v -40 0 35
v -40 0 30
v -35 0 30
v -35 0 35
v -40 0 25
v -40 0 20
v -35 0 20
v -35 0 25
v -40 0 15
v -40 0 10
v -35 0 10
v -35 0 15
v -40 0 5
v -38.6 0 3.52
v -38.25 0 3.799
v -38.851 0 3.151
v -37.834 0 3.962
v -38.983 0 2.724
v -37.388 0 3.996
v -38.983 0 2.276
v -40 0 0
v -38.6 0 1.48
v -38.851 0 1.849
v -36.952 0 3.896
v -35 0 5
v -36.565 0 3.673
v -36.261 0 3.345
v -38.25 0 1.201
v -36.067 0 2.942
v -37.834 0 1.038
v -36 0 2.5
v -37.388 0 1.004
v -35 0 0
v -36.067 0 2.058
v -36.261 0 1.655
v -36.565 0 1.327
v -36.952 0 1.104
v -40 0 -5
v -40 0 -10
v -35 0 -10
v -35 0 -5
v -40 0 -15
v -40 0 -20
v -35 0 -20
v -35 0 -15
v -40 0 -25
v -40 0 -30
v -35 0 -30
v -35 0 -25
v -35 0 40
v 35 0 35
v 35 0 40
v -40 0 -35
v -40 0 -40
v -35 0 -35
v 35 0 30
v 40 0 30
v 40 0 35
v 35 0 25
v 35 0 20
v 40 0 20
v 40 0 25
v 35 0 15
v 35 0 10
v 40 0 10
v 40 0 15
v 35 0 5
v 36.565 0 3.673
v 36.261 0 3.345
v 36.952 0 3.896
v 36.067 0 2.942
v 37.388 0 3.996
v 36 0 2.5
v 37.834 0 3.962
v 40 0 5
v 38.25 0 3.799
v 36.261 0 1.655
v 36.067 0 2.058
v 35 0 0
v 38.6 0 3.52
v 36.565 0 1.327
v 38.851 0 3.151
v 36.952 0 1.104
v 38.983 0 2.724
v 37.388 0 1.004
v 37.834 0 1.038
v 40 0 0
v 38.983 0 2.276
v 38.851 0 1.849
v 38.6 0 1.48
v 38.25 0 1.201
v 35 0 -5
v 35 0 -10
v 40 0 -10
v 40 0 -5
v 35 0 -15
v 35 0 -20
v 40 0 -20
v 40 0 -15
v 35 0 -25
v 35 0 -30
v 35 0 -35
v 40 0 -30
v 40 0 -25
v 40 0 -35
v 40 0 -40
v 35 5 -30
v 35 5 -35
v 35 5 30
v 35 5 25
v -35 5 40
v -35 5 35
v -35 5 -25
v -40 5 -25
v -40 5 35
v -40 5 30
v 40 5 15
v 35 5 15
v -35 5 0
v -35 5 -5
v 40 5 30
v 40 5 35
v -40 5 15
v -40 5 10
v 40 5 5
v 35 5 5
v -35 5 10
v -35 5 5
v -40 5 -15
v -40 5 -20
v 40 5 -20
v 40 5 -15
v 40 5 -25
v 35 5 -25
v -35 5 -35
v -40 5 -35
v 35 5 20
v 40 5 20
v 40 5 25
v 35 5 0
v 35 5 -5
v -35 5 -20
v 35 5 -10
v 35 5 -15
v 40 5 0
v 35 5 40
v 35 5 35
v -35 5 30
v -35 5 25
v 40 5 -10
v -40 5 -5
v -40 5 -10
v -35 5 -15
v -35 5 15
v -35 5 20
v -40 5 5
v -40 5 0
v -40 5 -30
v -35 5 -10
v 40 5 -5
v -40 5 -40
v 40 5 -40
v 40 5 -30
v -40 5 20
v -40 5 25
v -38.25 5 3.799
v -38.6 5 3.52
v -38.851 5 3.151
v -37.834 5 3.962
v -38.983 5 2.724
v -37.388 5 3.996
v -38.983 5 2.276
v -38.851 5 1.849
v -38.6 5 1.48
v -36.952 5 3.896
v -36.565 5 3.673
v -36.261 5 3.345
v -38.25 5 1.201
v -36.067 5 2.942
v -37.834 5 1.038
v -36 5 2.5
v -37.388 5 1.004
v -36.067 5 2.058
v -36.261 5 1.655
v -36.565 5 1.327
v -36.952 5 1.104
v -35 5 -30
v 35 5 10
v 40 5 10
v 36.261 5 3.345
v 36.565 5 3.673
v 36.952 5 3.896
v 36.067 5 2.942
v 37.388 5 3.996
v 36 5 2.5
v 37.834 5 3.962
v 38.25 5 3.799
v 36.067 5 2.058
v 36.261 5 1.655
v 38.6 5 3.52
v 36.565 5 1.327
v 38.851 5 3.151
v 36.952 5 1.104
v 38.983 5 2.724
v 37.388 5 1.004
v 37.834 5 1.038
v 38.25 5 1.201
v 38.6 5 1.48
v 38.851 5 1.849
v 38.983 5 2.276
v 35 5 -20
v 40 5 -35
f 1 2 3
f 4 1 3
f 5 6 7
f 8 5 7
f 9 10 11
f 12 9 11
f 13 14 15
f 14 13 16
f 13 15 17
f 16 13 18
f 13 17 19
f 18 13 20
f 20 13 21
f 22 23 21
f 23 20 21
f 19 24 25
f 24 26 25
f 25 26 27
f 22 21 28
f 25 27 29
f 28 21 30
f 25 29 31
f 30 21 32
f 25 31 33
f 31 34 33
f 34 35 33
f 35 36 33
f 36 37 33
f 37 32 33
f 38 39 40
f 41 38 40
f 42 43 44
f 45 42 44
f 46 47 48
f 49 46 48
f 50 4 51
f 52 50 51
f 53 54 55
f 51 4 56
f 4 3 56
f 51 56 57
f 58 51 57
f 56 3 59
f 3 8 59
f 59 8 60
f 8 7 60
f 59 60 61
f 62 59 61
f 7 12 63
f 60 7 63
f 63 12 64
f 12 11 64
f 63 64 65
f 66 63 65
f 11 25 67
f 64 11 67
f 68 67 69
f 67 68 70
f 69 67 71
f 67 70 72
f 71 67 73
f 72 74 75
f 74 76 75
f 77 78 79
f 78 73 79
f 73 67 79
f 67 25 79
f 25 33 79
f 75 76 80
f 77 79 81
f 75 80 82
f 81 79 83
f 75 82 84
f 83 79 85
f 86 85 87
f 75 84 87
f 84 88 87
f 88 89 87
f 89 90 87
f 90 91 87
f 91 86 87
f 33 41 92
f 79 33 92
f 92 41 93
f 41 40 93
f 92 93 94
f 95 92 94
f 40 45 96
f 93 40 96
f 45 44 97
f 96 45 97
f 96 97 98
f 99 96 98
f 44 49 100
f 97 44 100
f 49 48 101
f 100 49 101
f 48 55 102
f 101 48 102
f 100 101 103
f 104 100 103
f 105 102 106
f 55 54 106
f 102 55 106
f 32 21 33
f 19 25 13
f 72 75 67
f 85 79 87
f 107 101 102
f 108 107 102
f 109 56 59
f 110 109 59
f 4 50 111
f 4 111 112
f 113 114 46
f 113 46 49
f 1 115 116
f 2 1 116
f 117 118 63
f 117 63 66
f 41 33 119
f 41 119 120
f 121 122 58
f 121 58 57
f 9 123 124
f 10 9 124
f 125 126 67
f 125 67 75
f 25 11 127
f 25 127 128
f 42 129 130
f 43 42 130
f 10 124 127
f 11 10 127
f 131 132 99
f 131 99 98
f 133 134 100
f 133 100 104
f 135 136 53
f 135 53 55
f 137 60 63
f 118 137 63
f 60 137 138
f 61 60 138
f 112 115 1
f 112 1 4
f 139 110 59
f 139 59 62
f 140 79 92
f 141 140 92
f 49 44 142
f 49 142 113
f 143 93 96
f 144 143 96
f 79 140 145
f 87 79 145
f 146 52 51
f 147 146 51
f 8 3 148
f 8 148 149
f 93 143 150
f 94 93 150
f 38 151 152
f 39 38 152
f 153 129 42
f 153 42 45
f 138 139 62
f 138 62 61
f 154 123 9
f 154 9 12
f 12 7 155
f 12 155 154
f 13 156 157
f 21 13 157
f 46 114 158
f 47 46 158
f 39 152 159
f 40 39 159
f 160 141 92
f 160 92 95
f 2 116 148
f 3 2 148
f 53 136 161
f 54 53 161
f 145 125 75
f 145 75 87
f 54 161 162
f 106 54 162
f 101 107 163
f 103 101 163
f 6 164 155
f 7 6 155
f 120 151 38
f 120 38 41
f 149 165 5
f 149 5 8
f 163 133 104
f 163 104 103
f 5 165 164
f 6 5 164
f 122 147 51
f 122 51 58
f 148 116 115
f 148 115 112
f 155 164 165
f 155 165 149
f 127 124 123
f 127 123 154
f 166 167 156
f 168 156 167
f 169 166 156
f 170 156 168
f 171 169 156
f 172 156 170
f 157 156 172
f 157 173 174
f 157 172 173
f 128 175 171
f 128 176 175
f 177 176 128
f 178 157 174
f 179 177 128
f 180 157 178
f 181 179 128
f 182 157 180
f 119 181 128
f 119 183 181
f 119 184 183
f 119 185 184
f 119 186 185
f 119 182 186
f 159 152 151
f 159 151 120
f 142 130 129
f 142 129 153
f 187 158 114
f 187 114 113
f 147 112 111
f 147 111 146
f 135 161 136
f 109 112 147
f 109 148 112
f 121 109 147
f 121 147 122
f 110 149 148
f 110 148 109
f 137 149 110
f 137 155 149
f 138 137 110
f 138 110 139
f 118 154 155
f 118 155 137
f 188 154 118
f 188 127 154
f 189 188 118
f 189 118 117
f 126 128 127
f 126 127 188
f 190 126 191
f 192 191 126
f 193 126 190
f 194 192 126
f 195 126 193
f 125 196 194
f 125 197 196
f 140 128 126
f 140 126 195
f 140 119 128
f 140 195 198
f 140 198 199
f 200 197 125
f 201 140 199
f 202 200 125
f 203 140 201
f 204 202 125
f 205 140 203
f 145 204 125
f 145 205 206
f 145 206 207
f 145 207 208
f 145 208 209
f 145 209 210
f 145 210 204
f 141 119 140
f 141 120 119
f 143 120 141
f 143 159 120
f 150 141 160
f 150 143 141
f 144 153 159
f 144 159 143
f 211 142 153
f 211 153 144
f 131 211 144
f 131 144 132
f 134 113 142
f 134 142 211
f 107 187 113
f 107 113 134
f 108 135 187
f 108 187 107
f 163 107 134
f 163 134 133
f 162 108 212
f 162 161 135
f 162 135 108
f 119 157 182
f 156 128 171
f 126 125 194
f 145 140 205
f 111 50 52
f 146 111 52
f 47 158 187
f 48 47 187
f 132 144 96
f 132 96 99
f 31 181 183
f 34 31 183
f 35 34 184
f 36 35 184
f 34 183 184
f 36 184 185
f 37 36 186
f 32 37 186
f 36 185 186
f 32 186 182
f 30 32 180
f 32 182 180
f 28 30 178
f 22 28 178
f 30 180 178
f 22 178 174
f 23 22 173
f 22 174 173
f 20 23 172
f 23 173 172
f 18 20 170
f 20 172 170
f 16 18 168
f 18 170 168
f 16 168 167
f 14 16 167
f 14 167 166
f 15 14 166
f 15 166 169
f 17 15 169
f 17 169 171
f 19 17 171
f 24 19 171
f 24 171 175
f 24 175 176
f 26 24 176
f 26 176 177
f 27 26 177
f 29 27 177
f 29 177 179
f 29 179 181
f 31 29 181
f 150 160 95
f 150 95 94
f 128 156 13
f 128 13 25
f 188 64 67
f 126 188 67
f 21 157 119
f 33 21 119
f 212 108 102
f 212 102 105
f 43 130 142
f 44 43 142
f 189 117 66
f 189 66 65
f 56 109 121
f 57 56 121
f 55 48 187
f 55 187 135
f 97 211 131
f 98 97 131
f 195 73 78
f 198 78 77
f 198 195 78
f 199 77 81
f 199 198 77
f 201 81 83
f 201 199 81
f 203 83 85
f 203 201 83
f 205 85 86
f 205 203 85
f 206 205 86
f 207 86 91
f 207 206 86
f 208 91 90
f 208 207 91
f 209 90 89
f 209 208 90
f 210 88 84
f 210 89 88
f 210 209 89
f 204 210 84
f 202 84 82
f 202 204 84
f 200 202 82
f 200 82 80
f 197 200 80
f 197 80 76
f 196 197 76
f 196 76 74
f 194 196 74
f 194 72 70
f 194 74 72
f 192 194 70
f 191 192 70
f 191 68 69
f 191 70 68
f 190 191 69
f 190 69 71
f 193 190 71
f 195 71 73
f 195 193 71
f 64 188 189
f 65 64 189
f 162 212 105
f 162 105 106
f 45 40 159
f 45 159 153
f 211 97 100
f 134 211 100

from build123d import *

# Parameters (mm, degrees)
ESQUISSE1_W                     = 70
ESQUISSE1_H                     = 80
BOSS_EXTRU_1_DEPTH              = 5
ESQUISSE2_W                     = 5
ESQUISSE2_H                     = 5
BOSS_EXTRU_2_DEPTH              = 5
R_P_TITION_LIN_AIRE1_COUNT      = 2
R_P_TITION_LIN_AIRE1_PITCH      = 75
R_P_TITION_LIN_AIRE1_COUNT_DIR2 = 8
R_P_TITION_LIN_AIRE1_PITCH_DIR2 = 10
ESQUISSE3_R                     = 1.5
ENL_V_MAT_EXTRU_1_DEPTH         = 10


with BuildPart() as part:
    # Esquisse1 → Boss.-Extru.1 (new body)
    with BuildSketch(Plane(origin=(0, 0, 0), x_dir=(1, 0, 0), z_dir=(0, 1, 0))):
        Rectangle(ESQUISSE1_W, ESQUISSE1_H)
    extrude(amount=BOSS_EXTRU_1_DEPTH)

    # Esquisse2 → Boss.-Extru.2 (add)
    with BuildSketch(Plane(origin=(0, 5, 0), x_dir=(1, 0, 0), z_dir=(0, 1, 0))):
        with Locations((-37.5, 37.5)):
            Rectangle(ESQUISSE2_W, ESQUISSE2_H)
    boss_extru_2 = extrude(amount=-BOSS_EXTRU_2_DEPTH)

    # Répétition linéaire1: Boss.-Extru.2 2 × 8
    with Locations(*[(i * R_P_TITION_LIN_AIRE1_PITCH, 0, j * R_P_TITION_LIN_AIRE1_PITCH_DIR2) for i in range(R_P_TITION_LIN_AIRE1_COUNT) for j in range(R_P_TITION_LIN_AIRE1_COUNT_DIR2) if (i, j) != (0, 0)]):
        add(boss_extru_2)

    # Esquisse3 → Enlèv. mat.-Extru.1 (cut)
    with BuildSketch(Plane(origin=(0, 5, 0), x_dir=(1, 0, 0), z_dir=(0, 1, 0))):
        with Locations((-37.5, -2.5)):
            Circle(ESQUISSE3_R)
    enl_v_mat_extru_1 = extrude(amount=-ENL_V_MAT_EXTRU_1_DEPTH, mode=Mode.SUBTRACT)

    # Symétrie1: Enlèv. mat.-Extru.1 across plane
    add(enl_v_mat_extru_1.mirror(Plane(origin=(0, 0, 0), x_dir=(0, 0, 1), z_dir=(1, 0, 0))), mode=Mode.SUBTRACT)


solid = part.part
